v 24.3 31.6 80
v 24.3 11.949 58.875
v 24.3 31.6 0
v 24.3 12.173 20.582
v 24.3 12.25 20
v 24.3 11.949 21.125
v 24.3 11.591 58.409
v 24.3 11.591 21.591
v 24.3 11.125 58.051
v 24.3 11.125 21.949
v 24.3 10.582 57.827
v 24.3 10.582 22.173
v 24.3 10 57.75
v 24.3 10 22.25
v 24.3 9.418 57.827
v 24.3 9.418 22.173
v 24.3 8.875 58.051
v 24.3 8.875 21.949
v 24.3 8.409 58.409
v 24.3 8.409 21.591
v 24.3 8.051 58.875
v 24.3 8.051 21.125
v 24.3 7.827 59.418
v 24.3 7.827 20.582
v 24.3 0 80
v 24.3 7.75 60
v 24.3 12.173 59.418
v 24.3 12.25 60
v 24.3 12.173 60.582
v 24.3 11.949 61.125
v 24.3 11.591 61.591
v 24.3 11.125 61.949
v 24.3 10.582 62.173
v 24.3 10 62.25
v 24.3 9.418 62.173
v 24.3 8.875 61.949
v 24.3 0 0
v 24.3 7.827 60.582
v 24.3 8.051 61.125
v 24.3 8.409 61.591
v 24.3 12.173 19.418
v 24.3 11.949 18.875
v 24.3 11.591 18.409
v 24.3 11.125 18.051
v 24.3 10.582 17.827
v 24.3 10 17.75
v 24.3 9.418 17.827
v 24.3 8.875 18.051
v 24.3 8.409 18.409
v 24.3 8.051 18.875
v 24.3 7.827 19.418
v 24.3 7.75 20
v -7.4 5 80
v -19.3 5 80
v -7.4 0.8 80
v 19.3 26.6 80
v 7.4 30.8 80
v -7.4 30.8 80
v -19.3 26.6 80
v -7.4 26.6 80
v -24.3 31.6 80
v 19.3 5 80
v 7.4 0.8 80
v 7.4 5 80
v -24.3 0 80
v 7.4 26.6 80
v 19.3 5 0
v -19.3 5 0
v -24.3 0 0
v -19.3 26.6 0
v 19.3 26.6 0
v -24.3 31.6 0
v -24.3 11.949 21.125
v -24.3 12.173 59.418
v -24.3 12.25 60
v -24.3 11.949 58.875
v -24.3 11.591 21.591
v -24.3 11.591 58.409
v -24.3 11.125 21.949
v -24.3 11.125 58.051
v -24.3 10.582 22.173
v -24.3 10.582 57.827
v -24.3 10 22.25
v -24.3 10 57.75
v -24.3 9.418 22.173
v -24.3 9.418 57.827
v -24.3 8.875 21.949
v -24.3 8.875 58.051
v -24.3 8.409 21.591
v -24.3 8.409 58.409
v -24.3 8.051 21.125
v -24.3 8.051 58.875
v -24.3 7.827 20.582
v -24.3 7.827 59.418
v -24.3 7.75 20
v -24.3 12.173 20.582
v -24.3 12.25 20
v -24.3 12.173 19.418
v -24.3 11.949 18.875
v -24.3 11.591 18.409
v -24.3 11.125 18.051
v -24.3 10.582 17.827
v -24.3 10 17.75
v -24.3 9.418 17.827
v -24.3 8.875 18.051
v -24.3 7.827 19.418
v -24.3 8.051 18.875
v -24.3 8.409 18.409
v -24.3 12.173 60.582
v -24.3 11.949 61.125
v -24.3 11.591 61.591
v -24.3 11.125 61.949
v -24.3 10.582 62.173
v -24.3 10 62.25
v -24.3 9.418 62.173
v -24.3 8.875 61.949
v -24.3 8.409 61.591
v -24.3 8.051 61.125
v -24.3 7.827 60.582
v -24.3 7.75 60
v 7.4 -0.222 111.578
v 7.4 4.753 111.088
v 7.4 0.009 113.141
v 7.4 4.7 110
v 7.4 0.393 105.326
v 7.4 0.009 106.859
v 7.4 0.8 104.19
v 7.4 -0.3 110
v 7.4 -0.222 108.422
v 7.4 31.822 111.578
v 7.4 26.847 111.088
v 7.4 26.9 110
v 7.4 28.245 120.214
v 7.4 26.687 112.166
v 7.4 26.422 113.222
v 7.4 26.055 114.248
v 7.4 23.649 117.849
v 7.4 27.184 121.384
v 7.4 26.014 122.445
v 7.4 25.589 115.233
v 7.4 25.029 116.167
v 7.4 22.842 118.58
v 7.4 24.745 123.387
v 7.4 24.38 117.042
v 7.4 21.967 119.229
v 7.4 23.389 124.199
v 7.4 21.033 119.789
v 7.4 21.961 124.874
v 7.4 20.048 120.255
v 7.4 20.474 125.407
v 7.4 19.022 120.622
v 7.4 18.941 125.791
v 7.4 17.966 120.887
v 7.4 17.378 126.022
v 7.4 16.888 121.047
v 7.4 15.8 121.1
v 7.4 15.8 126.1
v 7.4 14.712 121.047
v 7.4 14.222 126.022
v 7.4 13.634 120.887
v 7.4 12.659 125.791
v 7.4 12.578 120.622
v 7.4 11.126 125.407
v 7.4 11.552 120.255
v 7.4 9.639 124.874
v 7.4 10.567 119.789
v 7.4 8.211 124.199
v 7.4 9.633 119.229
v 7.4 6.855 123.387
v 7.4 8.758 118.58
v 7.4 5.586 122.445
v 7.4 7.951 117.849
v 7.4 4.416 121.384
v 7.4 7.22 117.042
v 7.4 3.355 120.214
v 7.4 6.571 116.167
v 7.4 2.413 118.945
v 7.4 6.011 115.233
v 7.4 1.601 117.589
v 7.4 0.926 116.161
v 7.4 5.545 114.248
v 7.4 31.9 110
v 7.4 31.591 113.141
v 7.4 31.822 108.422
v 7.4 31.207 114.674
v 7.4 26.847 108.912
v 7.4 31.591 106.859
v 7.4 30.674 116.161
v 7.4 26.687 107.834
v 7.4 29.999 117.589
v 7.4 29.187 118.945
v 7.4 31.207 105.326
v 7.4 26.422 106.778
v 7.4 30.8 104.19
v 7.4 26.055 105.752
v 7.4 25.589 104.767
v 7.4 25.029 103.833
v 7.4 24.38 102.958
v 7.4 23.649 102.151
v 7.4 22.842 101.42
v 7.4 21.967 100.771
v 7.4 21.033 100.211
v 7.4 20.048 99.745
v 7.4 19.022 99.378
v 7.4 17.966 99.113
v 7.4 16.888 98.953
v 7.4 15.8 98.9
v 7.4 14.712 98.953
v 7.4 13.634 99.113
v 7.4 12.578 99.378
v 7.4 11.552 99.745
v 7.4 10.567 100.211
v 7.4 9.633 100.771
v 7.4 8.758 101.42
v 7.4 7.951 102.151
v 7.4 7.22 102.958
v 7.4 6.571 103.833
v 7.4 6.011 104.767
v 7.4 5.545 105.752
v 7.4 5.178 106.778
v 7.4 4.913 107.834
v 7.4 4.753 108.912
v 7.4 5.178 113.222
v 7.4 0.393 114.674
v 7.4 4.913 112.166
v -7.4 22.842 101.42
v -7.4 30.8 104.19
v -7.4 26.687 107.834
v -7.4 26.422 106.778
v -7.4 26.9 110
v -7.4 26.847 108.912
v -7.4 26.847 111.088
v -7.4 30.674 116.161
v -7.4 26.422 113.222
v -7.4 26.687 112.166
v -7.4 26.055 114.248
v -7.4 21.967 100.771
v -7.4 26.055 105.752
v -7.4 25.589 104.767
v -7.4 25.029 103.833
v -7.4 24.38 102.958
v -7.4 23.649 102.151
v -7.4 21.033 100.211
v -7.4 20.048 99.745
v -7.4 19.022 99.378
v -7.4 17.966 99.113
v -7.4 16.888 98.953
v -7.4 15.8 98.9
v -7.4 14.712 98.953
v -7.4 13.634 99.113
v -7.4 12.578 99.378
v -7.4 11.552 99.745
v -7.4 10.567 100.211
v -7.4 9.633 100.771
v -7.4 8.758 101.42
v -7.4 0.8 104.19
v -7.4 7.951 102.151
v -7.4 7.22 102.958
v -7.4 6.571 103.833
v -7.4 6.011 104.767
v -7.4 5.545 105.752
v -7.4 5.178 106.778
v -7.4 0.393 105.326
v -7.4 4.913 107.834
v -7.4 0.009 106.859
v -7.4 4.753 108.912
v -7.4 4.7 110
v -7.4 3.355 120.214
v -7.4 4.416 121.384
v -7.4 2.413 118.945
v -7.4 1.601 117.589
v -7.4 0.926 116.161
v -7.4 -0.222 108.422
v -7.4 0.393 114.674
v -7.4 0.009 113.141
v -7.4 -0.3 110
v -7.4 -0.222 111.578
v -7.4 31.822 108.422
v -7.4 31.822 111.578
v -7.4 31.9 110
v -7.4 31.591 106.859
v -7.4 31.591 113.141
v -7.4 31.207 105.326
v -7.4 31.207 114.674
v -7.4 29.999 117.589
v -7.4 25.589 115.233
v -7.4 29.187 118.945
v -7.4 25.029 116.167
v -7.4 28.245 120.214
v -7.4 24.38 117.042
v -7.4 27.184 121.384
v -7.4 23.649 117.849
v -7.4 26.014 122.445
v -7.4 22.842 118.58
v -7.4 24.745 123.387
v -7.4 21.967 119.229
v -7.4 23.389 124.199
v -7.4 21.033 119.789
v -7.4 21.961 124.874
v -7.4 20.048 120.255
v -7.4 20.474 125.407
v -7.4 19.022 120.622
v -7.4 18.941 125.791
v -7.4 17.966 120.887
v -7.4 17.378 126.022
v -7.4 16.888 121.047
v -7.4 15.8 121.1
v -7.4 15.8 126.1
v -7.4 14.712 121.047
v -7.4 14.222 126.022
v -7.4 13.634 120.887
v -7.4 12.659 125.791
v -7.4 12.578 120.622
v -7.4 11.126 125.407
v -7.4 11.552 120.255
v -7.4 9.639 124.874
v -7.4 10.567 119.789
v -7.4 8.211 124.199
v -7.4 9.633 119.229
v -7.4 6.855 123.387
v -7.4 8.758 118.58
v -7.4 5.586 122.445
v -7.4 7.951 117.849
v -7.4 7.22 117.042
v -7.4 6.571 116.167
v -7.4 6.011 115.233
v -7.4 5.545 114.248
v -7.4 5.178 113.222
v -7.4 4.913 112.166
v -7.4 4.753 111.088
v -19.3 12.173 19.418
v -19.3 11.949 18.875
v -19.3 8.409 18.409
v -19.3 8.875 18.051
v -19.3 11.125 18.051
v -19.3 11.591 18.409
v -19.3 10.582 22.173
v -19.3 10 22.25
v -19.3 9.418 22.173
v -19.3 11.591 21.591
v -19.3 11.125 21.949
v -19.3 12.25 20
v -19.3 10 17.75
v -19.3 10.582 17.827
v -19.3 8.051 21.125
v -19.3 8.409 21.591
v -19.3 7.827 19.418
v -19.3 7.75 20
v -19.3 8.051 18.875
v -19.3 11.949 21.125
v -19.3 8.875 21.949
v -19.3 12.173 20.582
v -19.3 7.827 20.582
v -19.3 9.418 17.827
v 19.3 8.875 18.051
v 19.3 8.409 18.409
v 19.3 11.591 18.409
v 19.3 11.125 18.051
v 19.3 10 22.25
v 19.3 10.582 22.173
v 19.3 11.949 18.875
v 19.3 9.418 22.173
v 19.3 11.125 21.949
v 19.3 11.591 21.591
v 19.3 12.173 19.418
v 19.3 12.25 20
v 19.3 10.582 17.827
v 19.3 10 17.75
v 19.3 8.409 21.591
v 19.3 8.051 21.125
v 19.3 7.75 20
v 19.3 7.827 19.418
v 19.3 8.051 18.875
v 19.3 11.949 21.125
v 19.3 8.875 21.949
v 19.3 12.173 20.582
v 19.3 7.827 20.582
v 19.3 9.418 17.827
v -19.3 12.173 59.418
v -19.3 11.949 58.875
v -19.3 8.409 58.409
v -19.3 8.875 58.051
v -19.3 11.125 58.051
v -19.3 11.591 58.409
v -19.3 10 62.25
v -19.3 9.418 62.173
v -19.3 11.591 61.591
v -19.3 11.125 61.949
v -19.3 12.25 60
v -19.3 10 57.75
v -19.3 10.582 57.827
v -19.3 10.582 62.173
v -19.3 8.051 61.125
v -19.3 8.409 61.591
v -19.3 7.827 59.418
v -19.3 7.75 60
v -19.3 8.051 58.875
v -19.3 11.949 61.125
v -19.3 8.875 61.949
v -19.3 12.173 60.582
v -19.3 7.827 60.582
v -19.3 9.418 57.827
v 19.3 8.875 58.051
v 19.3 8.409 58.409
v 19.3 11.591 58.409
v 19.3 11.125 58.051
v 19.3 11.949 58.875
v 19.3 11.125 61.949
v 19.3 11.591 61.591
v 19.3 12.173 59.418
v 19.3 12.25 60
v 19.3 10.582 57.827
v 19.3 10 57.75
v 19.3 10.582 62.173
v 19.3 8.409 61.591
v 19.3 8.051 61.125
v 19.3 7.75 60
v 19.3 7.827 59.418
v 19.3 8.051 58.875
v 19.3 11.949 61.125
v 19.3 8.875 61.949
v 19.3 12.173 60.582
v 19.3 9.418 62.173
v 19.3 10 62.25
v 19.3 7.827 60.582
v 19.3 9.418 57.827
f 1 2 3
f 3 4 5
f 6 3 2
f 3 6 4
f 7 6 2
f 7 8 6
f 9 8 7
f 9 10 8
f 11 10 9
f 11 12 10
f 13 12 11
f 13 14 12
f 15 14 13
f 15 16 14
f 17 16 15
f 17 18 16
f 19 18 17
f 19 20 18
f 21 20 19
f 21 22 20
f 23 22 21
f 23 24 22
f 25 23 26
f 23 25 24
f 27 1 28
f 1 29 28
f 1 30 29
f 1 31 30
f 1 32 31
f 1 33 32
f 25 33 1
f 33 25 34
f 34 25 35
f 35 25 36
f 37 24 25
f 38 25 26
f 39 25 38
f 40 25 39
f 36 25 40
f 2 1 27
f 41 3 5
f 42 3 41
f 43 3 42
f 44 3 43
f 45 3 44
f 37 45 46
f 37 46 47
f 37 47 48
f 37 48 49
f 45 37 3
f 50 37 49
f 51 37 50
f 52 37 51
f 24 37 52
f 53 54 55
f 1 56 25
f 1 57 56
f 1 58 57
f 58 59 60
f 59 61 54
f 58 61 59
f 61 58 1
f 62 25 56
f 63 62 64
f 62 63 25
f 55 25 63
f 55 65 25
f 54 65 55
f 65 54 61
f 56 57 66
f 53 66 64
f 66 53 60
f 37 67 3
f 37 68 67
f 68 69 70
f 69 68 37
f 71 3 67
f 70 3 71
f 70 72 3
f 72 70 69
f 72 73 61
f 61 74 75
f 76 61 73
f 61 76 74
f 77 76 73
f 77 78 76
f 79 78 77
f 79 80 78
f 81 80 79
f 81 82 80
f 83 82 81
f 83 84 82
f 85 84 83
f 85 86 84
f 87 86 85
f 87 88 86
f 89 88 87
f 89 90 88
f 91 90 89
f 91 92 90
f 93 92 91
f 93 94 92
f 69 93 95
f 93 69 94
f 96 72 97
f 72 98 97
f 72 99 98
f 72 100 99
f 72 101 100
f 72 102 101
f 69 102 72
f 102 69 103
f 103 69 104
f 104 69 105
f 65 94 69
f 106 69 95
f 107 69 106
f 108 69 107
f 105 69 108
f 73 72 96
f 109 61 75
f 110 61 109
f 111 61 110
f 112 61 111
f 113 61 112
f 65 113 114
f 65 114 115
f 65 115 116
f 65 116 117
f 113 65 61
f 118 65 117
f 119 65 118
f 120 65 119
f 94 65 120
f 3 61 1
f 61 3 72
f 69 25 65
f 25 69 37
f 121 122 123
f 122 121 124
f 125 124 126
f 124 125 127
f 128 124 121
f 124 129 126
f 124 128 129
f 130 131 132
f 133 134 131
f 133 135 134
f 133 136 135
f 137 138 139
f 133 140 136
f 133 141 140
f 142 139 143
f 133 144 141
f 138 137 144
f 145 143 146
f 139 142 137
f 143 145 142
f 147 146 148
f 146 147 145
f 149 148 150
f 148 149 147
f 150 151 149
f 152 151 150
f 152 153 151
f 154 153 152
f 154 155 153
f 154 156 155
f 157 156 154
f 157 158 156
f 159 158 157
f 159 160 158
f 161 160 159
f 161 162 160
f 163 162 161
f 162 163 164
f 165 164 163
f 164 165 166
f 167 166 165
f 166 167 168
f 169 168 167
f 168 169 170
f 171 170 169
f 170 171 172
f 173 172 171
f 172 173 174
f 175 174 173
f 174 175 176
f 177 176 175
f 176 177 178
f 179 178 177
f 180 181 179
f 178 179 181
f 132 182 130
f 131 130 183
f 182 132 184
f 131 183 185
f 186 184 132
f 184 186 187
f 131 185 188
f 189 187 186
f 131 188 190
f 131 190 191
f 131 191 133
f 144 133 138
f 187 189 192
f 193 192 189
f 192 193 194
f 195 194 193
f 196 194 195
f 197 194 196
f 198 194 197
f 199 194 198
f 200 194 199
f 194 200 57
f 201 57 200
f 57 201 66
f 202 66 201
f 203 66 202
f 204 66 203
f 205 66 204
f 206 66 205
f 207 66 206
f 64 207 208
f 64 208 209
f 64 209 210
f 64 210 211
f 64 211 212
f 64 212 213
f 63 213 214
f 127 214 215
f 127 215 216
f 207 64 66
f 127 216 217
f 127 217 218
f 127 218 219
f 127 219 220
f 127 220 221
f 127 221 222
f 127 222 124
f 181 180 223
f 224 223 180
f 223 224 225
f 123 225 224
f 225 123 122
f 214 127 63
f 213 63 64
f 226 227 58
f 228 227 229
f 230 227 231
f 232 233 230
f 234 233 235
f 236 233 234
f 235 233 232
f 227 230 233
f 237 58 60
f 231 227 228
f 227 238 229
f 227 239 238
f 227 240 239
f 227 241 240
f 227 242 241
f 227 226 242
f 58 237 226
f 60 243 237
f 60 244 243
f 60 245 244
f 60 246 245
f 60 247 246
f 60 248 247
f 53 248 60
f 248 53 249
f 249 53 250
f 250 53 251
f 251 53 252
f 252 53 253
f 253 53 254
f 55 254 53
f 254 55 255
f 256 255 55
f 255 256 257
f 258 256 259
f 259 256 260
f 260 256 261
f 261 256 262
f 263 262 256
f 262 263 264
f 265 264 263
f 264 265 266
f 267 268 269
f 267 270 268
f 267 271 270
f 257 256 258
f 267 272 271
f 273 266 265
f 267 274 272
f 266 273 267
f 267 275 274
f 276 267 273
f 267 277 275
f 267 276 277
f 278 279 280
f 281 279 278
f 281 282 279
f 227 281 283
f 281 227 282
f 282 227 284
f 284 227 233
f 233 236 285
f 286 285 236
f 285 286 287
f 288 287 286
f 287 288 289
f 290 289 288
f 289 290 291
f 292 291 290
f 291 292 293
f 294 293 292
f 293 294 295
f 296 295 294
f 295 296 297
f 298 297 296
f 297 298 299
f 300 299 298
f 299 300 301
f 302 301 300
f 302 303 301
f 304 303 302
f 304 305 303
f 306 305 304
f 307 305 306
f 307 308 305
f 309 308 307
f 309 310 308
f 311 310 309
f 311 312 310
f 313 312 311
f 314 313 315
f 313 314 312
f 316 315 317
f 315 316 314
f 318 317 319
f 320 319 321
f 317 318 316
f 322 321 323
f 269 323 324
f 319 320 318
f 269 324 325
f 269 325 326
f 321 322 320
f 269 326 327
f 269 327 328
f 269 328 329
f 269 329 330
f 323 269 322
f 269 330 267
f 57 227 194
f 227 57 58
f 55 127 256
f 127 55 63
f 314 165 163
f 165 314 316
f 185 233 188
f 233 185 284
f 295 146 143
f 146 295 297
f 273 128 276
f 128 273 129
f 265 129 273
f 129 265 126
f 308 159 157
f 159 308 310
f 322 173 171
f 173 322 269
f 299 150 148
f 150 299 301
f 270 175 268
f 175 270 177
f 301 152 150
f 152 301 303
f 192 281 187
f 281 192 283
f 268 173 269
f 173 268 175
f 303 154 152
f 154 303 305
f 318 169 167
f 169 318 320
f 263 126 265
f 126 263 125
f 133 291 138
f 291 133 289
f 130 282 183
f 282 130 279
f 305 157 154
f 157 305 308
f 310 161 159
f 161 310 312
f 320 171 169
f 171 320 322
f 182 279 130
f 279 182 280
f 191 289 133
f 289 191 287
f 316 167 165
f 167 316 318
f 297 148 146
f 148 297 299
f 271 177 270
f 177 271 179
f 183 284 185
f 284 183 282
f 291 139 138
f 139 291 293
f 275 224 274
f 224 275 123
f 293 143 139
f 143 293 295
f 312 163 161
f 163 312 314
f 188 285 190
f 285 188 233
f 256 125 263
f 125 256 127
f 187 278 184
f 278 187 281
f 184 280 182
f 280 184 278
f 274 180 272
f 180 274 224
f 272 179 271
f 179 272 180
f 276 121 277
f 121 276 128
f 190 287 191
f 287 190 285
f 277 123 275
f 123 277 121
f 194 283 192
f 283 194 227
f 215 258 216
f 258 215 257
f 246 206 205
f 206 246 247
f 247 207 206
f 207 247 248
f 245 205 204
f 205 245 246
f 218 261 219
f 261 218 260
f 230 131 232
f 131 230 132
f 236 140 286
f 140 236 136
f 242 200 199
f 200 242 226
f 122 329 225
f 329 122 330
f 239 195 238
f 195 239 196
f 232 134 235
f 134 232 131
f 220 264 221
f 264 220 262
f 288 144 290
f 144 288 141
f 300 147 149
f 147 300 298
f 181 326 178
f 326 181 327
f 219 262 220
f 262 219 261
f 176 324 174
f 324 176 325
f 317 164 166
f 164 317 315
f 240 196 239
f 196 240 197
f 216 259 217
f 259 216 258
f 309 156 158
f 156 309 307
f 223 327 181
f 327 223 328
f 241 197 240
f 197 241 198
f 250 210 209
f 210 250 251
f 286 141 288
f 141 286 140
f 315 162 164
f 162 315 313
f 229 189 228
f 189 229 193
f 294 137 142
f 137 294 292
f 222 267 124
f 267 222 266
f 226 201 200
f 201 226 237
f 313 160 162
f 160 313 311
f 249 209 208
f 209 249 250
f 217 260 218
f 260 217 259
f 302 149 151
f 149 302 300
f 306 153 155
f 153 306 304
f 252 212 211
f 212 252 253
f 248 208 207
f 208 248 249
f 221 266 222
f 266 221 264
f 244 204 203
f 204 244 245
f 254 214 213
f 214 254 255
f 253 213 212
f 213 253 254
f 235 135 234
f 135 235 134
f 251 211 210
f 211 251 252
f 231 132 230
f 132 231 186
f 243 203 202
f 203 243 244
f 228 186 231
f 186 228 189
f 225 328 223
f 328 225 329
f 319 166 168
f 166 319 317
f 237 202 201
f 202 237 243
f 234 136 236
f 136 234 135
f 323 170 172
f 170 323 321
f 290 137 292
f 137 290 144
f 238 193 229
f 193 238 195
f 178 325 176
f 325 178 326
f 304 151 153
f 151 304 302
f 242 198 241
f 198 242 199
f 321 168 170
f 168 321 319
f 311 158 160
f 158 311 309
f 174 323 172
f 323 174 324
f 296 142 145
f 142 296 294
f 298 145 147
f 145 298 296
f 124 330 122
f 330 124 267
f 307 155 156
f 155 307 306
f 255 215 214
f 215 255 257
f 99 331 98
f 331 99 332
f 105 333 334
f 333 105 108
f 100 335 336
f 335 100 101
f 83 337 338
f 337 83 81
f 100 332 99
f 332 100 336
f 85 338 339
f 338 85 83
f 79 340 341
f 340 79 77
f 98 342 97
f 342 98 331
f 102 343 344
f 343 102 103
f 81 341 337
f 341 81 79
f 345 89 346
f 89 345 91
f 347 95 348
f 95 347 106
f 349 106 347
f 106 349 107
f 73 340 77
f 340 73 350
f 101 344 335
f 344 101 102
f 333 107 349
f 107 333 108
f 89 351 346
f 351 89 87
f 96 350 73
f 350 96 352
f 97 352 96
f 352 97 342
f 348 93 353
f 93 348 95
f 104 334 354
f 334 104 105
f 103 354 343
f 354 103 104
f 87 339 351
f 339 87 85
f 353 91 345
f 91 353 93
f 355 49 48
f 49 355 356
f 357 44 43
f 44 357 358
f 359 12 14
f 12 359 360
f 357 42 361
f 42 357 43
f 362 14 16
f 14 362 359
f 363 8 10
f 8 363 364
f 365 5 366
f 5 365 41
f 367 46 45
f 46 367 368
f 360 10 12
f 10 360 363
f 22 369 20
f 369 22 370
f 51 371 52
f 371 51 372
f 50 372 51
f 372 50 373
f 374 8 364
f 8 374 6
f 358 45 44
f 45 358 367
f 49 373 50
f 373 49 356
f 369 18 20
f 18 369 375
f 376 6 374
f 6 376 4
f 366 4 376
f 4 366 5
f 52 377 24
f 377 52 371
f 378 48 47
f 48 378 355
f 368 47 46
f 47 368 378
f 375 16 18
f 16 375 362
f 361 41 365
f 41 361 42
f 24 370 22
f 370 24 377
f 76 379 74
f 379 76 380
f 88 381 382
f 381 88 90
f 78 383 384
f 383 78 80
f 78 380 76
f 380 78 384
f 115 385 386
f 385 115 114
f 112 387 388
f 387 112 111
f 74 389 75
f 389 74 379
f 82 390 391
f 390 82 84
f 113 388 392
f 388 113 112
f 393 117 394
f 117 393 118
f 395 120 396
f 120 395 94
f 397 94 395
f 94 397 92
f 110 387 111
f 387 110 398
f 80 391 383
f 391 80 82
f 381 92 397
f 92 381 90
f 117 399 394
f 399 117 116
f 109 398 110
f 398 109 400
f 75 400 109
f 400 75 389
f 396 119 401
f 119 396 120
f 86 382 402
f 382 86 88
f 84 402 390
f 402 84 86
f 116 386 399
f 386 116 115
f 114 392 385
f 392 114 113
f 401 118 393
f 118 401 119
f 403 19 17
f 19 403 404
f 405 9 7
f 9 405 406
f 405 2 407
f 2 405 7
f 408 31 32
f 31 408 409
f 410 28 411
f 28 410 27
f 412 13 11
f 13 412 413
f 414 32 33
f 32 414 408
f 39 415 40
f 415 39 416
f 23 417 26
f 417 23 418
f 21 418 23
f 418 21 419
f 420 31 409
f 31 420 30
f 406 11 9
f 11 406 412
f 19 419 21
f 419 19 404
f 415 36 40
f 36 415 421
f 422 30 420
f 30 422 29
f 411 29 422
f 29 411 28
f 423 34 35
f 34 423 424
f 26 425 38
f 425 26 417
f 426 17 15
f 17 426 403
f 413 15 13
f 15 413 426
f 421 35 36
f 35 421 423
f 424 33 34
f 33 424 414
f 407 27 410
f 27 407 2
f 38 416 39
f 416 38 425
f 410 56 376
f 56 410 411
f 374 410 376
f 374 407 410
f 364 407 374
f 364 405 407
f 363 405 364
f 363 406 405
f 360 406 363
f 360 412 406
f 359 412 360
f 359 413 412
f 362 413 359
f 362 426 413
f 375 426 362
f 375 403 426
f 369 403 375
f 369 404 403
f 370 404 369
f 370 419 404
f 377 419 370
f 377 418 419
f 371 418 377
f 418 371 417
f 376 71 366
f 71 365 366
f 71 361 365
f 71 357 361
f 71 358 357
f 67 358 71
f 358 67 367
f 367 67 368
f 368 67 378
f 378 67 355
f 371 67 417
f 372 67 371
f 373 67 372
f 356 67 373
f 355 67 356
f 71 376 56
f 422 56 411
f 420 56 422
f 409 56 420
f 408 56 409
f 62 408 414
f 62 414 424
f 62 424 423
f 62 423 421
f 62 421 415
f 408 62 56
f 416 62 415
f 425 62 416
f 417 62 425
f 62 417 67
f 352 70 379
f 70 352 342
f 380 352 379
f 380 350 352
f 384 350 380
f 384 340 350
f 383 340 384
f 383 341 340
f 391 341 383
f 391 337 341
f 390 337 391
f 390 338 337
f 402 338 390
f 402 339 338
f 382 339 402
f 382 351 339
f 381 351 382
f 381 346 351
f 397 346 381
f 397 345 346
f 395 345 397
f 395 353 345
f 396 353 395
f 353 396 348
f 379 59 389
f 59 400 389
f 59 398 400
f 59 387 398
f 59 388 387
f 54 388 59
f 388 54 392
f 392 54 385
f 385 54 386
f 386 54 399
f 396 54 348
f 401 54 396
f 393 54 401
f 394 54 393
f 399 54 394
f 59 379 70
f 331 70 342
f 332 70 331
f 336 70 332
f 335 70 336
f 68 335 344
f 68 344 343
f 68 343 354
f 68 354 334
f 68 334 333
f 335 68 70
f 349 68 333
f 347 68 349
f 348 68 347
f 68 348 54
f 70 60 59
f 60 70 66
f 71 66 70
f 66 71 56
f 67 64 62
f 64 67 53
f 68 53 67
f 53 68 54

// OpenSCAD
// PROJECT: 5kg Vertical Panel Actuator
// PART: Bearing-Pivot Timber Glove (38x21mm Timber)
// HARDWARE: 2x 608RS Bearings (Stacked) + M8 Pivot Bolt

timber_w = 38.6; // +0.6 tolerance for PETG
timber_t = 21.6; 
sleeve_depth = 80;
wall_thick = 5;      // Beefier walls for bearing housing
bearing_od = 22.2;    // 608RS OD
bearing_thick = 7.1;  // Single bearing thickness
tongue_w = 14.8;     // Fits your 15mm slider gap (2x bearings)

module bearing_glove() {
    difference() {
        union() {
            // Main Sleeve Body
            translate([-(timber_w + wall_thick*2)/2, 0, 0])
                cube([timber_w + wall_thick*2, timber_t + wall_thick*2, sleeve_depth]);
            
            // Structural Neck to Tongue
            translate([-tongue_w/2, (timber_t + wall_thick*2)/2 - 15, sleeve_depth])
                cube([tongue_w, 30, 30]); // Extended neck for 5kg support
            
            // Rounded Bearing Housing
            translate([0, (timber_t + wall_thick*2)/2, sleeve_depth + 30])
                rotate([0, 90, 0])
                    cylinder(d=bearing_od + 10, h=tongue_w, center=true, $fn=64);
        }

        // Internal Timber Pocket
        translate([-timber_w/2, wall_thick, -1])
            cube([timber_w, timber_t, sleeve_depth + 1]);

        // BEARING POCKET (Through the tongue)
        translate([0, (timber_t + wall_thick*2)/2, sleeve_depth + 30])
            rotate([0, 90, 0]) {
                // Pocket for 2x 608RS Bearings
                cylinder(d=bearing_od, h=tongue_w + 1, center=true, $fn=64);
                // M8 Clear hole for the axle bolt
                cylinder(d=8.5, h=tongue_w + 10, center=true, $fn=32);
            }

        // Adjustment Screw Holes (M4/M5)
        for(z = [20, 60]) {
            for(side = [-1, 1]) {
                translate([side * (timber_w/2 + 5), 10, z])
                    rotate([0, 90, 0]) cylinder(d=4.5, h=20, center=true, $fn=24);
            }
        }
    }
}

bearing_glove();
